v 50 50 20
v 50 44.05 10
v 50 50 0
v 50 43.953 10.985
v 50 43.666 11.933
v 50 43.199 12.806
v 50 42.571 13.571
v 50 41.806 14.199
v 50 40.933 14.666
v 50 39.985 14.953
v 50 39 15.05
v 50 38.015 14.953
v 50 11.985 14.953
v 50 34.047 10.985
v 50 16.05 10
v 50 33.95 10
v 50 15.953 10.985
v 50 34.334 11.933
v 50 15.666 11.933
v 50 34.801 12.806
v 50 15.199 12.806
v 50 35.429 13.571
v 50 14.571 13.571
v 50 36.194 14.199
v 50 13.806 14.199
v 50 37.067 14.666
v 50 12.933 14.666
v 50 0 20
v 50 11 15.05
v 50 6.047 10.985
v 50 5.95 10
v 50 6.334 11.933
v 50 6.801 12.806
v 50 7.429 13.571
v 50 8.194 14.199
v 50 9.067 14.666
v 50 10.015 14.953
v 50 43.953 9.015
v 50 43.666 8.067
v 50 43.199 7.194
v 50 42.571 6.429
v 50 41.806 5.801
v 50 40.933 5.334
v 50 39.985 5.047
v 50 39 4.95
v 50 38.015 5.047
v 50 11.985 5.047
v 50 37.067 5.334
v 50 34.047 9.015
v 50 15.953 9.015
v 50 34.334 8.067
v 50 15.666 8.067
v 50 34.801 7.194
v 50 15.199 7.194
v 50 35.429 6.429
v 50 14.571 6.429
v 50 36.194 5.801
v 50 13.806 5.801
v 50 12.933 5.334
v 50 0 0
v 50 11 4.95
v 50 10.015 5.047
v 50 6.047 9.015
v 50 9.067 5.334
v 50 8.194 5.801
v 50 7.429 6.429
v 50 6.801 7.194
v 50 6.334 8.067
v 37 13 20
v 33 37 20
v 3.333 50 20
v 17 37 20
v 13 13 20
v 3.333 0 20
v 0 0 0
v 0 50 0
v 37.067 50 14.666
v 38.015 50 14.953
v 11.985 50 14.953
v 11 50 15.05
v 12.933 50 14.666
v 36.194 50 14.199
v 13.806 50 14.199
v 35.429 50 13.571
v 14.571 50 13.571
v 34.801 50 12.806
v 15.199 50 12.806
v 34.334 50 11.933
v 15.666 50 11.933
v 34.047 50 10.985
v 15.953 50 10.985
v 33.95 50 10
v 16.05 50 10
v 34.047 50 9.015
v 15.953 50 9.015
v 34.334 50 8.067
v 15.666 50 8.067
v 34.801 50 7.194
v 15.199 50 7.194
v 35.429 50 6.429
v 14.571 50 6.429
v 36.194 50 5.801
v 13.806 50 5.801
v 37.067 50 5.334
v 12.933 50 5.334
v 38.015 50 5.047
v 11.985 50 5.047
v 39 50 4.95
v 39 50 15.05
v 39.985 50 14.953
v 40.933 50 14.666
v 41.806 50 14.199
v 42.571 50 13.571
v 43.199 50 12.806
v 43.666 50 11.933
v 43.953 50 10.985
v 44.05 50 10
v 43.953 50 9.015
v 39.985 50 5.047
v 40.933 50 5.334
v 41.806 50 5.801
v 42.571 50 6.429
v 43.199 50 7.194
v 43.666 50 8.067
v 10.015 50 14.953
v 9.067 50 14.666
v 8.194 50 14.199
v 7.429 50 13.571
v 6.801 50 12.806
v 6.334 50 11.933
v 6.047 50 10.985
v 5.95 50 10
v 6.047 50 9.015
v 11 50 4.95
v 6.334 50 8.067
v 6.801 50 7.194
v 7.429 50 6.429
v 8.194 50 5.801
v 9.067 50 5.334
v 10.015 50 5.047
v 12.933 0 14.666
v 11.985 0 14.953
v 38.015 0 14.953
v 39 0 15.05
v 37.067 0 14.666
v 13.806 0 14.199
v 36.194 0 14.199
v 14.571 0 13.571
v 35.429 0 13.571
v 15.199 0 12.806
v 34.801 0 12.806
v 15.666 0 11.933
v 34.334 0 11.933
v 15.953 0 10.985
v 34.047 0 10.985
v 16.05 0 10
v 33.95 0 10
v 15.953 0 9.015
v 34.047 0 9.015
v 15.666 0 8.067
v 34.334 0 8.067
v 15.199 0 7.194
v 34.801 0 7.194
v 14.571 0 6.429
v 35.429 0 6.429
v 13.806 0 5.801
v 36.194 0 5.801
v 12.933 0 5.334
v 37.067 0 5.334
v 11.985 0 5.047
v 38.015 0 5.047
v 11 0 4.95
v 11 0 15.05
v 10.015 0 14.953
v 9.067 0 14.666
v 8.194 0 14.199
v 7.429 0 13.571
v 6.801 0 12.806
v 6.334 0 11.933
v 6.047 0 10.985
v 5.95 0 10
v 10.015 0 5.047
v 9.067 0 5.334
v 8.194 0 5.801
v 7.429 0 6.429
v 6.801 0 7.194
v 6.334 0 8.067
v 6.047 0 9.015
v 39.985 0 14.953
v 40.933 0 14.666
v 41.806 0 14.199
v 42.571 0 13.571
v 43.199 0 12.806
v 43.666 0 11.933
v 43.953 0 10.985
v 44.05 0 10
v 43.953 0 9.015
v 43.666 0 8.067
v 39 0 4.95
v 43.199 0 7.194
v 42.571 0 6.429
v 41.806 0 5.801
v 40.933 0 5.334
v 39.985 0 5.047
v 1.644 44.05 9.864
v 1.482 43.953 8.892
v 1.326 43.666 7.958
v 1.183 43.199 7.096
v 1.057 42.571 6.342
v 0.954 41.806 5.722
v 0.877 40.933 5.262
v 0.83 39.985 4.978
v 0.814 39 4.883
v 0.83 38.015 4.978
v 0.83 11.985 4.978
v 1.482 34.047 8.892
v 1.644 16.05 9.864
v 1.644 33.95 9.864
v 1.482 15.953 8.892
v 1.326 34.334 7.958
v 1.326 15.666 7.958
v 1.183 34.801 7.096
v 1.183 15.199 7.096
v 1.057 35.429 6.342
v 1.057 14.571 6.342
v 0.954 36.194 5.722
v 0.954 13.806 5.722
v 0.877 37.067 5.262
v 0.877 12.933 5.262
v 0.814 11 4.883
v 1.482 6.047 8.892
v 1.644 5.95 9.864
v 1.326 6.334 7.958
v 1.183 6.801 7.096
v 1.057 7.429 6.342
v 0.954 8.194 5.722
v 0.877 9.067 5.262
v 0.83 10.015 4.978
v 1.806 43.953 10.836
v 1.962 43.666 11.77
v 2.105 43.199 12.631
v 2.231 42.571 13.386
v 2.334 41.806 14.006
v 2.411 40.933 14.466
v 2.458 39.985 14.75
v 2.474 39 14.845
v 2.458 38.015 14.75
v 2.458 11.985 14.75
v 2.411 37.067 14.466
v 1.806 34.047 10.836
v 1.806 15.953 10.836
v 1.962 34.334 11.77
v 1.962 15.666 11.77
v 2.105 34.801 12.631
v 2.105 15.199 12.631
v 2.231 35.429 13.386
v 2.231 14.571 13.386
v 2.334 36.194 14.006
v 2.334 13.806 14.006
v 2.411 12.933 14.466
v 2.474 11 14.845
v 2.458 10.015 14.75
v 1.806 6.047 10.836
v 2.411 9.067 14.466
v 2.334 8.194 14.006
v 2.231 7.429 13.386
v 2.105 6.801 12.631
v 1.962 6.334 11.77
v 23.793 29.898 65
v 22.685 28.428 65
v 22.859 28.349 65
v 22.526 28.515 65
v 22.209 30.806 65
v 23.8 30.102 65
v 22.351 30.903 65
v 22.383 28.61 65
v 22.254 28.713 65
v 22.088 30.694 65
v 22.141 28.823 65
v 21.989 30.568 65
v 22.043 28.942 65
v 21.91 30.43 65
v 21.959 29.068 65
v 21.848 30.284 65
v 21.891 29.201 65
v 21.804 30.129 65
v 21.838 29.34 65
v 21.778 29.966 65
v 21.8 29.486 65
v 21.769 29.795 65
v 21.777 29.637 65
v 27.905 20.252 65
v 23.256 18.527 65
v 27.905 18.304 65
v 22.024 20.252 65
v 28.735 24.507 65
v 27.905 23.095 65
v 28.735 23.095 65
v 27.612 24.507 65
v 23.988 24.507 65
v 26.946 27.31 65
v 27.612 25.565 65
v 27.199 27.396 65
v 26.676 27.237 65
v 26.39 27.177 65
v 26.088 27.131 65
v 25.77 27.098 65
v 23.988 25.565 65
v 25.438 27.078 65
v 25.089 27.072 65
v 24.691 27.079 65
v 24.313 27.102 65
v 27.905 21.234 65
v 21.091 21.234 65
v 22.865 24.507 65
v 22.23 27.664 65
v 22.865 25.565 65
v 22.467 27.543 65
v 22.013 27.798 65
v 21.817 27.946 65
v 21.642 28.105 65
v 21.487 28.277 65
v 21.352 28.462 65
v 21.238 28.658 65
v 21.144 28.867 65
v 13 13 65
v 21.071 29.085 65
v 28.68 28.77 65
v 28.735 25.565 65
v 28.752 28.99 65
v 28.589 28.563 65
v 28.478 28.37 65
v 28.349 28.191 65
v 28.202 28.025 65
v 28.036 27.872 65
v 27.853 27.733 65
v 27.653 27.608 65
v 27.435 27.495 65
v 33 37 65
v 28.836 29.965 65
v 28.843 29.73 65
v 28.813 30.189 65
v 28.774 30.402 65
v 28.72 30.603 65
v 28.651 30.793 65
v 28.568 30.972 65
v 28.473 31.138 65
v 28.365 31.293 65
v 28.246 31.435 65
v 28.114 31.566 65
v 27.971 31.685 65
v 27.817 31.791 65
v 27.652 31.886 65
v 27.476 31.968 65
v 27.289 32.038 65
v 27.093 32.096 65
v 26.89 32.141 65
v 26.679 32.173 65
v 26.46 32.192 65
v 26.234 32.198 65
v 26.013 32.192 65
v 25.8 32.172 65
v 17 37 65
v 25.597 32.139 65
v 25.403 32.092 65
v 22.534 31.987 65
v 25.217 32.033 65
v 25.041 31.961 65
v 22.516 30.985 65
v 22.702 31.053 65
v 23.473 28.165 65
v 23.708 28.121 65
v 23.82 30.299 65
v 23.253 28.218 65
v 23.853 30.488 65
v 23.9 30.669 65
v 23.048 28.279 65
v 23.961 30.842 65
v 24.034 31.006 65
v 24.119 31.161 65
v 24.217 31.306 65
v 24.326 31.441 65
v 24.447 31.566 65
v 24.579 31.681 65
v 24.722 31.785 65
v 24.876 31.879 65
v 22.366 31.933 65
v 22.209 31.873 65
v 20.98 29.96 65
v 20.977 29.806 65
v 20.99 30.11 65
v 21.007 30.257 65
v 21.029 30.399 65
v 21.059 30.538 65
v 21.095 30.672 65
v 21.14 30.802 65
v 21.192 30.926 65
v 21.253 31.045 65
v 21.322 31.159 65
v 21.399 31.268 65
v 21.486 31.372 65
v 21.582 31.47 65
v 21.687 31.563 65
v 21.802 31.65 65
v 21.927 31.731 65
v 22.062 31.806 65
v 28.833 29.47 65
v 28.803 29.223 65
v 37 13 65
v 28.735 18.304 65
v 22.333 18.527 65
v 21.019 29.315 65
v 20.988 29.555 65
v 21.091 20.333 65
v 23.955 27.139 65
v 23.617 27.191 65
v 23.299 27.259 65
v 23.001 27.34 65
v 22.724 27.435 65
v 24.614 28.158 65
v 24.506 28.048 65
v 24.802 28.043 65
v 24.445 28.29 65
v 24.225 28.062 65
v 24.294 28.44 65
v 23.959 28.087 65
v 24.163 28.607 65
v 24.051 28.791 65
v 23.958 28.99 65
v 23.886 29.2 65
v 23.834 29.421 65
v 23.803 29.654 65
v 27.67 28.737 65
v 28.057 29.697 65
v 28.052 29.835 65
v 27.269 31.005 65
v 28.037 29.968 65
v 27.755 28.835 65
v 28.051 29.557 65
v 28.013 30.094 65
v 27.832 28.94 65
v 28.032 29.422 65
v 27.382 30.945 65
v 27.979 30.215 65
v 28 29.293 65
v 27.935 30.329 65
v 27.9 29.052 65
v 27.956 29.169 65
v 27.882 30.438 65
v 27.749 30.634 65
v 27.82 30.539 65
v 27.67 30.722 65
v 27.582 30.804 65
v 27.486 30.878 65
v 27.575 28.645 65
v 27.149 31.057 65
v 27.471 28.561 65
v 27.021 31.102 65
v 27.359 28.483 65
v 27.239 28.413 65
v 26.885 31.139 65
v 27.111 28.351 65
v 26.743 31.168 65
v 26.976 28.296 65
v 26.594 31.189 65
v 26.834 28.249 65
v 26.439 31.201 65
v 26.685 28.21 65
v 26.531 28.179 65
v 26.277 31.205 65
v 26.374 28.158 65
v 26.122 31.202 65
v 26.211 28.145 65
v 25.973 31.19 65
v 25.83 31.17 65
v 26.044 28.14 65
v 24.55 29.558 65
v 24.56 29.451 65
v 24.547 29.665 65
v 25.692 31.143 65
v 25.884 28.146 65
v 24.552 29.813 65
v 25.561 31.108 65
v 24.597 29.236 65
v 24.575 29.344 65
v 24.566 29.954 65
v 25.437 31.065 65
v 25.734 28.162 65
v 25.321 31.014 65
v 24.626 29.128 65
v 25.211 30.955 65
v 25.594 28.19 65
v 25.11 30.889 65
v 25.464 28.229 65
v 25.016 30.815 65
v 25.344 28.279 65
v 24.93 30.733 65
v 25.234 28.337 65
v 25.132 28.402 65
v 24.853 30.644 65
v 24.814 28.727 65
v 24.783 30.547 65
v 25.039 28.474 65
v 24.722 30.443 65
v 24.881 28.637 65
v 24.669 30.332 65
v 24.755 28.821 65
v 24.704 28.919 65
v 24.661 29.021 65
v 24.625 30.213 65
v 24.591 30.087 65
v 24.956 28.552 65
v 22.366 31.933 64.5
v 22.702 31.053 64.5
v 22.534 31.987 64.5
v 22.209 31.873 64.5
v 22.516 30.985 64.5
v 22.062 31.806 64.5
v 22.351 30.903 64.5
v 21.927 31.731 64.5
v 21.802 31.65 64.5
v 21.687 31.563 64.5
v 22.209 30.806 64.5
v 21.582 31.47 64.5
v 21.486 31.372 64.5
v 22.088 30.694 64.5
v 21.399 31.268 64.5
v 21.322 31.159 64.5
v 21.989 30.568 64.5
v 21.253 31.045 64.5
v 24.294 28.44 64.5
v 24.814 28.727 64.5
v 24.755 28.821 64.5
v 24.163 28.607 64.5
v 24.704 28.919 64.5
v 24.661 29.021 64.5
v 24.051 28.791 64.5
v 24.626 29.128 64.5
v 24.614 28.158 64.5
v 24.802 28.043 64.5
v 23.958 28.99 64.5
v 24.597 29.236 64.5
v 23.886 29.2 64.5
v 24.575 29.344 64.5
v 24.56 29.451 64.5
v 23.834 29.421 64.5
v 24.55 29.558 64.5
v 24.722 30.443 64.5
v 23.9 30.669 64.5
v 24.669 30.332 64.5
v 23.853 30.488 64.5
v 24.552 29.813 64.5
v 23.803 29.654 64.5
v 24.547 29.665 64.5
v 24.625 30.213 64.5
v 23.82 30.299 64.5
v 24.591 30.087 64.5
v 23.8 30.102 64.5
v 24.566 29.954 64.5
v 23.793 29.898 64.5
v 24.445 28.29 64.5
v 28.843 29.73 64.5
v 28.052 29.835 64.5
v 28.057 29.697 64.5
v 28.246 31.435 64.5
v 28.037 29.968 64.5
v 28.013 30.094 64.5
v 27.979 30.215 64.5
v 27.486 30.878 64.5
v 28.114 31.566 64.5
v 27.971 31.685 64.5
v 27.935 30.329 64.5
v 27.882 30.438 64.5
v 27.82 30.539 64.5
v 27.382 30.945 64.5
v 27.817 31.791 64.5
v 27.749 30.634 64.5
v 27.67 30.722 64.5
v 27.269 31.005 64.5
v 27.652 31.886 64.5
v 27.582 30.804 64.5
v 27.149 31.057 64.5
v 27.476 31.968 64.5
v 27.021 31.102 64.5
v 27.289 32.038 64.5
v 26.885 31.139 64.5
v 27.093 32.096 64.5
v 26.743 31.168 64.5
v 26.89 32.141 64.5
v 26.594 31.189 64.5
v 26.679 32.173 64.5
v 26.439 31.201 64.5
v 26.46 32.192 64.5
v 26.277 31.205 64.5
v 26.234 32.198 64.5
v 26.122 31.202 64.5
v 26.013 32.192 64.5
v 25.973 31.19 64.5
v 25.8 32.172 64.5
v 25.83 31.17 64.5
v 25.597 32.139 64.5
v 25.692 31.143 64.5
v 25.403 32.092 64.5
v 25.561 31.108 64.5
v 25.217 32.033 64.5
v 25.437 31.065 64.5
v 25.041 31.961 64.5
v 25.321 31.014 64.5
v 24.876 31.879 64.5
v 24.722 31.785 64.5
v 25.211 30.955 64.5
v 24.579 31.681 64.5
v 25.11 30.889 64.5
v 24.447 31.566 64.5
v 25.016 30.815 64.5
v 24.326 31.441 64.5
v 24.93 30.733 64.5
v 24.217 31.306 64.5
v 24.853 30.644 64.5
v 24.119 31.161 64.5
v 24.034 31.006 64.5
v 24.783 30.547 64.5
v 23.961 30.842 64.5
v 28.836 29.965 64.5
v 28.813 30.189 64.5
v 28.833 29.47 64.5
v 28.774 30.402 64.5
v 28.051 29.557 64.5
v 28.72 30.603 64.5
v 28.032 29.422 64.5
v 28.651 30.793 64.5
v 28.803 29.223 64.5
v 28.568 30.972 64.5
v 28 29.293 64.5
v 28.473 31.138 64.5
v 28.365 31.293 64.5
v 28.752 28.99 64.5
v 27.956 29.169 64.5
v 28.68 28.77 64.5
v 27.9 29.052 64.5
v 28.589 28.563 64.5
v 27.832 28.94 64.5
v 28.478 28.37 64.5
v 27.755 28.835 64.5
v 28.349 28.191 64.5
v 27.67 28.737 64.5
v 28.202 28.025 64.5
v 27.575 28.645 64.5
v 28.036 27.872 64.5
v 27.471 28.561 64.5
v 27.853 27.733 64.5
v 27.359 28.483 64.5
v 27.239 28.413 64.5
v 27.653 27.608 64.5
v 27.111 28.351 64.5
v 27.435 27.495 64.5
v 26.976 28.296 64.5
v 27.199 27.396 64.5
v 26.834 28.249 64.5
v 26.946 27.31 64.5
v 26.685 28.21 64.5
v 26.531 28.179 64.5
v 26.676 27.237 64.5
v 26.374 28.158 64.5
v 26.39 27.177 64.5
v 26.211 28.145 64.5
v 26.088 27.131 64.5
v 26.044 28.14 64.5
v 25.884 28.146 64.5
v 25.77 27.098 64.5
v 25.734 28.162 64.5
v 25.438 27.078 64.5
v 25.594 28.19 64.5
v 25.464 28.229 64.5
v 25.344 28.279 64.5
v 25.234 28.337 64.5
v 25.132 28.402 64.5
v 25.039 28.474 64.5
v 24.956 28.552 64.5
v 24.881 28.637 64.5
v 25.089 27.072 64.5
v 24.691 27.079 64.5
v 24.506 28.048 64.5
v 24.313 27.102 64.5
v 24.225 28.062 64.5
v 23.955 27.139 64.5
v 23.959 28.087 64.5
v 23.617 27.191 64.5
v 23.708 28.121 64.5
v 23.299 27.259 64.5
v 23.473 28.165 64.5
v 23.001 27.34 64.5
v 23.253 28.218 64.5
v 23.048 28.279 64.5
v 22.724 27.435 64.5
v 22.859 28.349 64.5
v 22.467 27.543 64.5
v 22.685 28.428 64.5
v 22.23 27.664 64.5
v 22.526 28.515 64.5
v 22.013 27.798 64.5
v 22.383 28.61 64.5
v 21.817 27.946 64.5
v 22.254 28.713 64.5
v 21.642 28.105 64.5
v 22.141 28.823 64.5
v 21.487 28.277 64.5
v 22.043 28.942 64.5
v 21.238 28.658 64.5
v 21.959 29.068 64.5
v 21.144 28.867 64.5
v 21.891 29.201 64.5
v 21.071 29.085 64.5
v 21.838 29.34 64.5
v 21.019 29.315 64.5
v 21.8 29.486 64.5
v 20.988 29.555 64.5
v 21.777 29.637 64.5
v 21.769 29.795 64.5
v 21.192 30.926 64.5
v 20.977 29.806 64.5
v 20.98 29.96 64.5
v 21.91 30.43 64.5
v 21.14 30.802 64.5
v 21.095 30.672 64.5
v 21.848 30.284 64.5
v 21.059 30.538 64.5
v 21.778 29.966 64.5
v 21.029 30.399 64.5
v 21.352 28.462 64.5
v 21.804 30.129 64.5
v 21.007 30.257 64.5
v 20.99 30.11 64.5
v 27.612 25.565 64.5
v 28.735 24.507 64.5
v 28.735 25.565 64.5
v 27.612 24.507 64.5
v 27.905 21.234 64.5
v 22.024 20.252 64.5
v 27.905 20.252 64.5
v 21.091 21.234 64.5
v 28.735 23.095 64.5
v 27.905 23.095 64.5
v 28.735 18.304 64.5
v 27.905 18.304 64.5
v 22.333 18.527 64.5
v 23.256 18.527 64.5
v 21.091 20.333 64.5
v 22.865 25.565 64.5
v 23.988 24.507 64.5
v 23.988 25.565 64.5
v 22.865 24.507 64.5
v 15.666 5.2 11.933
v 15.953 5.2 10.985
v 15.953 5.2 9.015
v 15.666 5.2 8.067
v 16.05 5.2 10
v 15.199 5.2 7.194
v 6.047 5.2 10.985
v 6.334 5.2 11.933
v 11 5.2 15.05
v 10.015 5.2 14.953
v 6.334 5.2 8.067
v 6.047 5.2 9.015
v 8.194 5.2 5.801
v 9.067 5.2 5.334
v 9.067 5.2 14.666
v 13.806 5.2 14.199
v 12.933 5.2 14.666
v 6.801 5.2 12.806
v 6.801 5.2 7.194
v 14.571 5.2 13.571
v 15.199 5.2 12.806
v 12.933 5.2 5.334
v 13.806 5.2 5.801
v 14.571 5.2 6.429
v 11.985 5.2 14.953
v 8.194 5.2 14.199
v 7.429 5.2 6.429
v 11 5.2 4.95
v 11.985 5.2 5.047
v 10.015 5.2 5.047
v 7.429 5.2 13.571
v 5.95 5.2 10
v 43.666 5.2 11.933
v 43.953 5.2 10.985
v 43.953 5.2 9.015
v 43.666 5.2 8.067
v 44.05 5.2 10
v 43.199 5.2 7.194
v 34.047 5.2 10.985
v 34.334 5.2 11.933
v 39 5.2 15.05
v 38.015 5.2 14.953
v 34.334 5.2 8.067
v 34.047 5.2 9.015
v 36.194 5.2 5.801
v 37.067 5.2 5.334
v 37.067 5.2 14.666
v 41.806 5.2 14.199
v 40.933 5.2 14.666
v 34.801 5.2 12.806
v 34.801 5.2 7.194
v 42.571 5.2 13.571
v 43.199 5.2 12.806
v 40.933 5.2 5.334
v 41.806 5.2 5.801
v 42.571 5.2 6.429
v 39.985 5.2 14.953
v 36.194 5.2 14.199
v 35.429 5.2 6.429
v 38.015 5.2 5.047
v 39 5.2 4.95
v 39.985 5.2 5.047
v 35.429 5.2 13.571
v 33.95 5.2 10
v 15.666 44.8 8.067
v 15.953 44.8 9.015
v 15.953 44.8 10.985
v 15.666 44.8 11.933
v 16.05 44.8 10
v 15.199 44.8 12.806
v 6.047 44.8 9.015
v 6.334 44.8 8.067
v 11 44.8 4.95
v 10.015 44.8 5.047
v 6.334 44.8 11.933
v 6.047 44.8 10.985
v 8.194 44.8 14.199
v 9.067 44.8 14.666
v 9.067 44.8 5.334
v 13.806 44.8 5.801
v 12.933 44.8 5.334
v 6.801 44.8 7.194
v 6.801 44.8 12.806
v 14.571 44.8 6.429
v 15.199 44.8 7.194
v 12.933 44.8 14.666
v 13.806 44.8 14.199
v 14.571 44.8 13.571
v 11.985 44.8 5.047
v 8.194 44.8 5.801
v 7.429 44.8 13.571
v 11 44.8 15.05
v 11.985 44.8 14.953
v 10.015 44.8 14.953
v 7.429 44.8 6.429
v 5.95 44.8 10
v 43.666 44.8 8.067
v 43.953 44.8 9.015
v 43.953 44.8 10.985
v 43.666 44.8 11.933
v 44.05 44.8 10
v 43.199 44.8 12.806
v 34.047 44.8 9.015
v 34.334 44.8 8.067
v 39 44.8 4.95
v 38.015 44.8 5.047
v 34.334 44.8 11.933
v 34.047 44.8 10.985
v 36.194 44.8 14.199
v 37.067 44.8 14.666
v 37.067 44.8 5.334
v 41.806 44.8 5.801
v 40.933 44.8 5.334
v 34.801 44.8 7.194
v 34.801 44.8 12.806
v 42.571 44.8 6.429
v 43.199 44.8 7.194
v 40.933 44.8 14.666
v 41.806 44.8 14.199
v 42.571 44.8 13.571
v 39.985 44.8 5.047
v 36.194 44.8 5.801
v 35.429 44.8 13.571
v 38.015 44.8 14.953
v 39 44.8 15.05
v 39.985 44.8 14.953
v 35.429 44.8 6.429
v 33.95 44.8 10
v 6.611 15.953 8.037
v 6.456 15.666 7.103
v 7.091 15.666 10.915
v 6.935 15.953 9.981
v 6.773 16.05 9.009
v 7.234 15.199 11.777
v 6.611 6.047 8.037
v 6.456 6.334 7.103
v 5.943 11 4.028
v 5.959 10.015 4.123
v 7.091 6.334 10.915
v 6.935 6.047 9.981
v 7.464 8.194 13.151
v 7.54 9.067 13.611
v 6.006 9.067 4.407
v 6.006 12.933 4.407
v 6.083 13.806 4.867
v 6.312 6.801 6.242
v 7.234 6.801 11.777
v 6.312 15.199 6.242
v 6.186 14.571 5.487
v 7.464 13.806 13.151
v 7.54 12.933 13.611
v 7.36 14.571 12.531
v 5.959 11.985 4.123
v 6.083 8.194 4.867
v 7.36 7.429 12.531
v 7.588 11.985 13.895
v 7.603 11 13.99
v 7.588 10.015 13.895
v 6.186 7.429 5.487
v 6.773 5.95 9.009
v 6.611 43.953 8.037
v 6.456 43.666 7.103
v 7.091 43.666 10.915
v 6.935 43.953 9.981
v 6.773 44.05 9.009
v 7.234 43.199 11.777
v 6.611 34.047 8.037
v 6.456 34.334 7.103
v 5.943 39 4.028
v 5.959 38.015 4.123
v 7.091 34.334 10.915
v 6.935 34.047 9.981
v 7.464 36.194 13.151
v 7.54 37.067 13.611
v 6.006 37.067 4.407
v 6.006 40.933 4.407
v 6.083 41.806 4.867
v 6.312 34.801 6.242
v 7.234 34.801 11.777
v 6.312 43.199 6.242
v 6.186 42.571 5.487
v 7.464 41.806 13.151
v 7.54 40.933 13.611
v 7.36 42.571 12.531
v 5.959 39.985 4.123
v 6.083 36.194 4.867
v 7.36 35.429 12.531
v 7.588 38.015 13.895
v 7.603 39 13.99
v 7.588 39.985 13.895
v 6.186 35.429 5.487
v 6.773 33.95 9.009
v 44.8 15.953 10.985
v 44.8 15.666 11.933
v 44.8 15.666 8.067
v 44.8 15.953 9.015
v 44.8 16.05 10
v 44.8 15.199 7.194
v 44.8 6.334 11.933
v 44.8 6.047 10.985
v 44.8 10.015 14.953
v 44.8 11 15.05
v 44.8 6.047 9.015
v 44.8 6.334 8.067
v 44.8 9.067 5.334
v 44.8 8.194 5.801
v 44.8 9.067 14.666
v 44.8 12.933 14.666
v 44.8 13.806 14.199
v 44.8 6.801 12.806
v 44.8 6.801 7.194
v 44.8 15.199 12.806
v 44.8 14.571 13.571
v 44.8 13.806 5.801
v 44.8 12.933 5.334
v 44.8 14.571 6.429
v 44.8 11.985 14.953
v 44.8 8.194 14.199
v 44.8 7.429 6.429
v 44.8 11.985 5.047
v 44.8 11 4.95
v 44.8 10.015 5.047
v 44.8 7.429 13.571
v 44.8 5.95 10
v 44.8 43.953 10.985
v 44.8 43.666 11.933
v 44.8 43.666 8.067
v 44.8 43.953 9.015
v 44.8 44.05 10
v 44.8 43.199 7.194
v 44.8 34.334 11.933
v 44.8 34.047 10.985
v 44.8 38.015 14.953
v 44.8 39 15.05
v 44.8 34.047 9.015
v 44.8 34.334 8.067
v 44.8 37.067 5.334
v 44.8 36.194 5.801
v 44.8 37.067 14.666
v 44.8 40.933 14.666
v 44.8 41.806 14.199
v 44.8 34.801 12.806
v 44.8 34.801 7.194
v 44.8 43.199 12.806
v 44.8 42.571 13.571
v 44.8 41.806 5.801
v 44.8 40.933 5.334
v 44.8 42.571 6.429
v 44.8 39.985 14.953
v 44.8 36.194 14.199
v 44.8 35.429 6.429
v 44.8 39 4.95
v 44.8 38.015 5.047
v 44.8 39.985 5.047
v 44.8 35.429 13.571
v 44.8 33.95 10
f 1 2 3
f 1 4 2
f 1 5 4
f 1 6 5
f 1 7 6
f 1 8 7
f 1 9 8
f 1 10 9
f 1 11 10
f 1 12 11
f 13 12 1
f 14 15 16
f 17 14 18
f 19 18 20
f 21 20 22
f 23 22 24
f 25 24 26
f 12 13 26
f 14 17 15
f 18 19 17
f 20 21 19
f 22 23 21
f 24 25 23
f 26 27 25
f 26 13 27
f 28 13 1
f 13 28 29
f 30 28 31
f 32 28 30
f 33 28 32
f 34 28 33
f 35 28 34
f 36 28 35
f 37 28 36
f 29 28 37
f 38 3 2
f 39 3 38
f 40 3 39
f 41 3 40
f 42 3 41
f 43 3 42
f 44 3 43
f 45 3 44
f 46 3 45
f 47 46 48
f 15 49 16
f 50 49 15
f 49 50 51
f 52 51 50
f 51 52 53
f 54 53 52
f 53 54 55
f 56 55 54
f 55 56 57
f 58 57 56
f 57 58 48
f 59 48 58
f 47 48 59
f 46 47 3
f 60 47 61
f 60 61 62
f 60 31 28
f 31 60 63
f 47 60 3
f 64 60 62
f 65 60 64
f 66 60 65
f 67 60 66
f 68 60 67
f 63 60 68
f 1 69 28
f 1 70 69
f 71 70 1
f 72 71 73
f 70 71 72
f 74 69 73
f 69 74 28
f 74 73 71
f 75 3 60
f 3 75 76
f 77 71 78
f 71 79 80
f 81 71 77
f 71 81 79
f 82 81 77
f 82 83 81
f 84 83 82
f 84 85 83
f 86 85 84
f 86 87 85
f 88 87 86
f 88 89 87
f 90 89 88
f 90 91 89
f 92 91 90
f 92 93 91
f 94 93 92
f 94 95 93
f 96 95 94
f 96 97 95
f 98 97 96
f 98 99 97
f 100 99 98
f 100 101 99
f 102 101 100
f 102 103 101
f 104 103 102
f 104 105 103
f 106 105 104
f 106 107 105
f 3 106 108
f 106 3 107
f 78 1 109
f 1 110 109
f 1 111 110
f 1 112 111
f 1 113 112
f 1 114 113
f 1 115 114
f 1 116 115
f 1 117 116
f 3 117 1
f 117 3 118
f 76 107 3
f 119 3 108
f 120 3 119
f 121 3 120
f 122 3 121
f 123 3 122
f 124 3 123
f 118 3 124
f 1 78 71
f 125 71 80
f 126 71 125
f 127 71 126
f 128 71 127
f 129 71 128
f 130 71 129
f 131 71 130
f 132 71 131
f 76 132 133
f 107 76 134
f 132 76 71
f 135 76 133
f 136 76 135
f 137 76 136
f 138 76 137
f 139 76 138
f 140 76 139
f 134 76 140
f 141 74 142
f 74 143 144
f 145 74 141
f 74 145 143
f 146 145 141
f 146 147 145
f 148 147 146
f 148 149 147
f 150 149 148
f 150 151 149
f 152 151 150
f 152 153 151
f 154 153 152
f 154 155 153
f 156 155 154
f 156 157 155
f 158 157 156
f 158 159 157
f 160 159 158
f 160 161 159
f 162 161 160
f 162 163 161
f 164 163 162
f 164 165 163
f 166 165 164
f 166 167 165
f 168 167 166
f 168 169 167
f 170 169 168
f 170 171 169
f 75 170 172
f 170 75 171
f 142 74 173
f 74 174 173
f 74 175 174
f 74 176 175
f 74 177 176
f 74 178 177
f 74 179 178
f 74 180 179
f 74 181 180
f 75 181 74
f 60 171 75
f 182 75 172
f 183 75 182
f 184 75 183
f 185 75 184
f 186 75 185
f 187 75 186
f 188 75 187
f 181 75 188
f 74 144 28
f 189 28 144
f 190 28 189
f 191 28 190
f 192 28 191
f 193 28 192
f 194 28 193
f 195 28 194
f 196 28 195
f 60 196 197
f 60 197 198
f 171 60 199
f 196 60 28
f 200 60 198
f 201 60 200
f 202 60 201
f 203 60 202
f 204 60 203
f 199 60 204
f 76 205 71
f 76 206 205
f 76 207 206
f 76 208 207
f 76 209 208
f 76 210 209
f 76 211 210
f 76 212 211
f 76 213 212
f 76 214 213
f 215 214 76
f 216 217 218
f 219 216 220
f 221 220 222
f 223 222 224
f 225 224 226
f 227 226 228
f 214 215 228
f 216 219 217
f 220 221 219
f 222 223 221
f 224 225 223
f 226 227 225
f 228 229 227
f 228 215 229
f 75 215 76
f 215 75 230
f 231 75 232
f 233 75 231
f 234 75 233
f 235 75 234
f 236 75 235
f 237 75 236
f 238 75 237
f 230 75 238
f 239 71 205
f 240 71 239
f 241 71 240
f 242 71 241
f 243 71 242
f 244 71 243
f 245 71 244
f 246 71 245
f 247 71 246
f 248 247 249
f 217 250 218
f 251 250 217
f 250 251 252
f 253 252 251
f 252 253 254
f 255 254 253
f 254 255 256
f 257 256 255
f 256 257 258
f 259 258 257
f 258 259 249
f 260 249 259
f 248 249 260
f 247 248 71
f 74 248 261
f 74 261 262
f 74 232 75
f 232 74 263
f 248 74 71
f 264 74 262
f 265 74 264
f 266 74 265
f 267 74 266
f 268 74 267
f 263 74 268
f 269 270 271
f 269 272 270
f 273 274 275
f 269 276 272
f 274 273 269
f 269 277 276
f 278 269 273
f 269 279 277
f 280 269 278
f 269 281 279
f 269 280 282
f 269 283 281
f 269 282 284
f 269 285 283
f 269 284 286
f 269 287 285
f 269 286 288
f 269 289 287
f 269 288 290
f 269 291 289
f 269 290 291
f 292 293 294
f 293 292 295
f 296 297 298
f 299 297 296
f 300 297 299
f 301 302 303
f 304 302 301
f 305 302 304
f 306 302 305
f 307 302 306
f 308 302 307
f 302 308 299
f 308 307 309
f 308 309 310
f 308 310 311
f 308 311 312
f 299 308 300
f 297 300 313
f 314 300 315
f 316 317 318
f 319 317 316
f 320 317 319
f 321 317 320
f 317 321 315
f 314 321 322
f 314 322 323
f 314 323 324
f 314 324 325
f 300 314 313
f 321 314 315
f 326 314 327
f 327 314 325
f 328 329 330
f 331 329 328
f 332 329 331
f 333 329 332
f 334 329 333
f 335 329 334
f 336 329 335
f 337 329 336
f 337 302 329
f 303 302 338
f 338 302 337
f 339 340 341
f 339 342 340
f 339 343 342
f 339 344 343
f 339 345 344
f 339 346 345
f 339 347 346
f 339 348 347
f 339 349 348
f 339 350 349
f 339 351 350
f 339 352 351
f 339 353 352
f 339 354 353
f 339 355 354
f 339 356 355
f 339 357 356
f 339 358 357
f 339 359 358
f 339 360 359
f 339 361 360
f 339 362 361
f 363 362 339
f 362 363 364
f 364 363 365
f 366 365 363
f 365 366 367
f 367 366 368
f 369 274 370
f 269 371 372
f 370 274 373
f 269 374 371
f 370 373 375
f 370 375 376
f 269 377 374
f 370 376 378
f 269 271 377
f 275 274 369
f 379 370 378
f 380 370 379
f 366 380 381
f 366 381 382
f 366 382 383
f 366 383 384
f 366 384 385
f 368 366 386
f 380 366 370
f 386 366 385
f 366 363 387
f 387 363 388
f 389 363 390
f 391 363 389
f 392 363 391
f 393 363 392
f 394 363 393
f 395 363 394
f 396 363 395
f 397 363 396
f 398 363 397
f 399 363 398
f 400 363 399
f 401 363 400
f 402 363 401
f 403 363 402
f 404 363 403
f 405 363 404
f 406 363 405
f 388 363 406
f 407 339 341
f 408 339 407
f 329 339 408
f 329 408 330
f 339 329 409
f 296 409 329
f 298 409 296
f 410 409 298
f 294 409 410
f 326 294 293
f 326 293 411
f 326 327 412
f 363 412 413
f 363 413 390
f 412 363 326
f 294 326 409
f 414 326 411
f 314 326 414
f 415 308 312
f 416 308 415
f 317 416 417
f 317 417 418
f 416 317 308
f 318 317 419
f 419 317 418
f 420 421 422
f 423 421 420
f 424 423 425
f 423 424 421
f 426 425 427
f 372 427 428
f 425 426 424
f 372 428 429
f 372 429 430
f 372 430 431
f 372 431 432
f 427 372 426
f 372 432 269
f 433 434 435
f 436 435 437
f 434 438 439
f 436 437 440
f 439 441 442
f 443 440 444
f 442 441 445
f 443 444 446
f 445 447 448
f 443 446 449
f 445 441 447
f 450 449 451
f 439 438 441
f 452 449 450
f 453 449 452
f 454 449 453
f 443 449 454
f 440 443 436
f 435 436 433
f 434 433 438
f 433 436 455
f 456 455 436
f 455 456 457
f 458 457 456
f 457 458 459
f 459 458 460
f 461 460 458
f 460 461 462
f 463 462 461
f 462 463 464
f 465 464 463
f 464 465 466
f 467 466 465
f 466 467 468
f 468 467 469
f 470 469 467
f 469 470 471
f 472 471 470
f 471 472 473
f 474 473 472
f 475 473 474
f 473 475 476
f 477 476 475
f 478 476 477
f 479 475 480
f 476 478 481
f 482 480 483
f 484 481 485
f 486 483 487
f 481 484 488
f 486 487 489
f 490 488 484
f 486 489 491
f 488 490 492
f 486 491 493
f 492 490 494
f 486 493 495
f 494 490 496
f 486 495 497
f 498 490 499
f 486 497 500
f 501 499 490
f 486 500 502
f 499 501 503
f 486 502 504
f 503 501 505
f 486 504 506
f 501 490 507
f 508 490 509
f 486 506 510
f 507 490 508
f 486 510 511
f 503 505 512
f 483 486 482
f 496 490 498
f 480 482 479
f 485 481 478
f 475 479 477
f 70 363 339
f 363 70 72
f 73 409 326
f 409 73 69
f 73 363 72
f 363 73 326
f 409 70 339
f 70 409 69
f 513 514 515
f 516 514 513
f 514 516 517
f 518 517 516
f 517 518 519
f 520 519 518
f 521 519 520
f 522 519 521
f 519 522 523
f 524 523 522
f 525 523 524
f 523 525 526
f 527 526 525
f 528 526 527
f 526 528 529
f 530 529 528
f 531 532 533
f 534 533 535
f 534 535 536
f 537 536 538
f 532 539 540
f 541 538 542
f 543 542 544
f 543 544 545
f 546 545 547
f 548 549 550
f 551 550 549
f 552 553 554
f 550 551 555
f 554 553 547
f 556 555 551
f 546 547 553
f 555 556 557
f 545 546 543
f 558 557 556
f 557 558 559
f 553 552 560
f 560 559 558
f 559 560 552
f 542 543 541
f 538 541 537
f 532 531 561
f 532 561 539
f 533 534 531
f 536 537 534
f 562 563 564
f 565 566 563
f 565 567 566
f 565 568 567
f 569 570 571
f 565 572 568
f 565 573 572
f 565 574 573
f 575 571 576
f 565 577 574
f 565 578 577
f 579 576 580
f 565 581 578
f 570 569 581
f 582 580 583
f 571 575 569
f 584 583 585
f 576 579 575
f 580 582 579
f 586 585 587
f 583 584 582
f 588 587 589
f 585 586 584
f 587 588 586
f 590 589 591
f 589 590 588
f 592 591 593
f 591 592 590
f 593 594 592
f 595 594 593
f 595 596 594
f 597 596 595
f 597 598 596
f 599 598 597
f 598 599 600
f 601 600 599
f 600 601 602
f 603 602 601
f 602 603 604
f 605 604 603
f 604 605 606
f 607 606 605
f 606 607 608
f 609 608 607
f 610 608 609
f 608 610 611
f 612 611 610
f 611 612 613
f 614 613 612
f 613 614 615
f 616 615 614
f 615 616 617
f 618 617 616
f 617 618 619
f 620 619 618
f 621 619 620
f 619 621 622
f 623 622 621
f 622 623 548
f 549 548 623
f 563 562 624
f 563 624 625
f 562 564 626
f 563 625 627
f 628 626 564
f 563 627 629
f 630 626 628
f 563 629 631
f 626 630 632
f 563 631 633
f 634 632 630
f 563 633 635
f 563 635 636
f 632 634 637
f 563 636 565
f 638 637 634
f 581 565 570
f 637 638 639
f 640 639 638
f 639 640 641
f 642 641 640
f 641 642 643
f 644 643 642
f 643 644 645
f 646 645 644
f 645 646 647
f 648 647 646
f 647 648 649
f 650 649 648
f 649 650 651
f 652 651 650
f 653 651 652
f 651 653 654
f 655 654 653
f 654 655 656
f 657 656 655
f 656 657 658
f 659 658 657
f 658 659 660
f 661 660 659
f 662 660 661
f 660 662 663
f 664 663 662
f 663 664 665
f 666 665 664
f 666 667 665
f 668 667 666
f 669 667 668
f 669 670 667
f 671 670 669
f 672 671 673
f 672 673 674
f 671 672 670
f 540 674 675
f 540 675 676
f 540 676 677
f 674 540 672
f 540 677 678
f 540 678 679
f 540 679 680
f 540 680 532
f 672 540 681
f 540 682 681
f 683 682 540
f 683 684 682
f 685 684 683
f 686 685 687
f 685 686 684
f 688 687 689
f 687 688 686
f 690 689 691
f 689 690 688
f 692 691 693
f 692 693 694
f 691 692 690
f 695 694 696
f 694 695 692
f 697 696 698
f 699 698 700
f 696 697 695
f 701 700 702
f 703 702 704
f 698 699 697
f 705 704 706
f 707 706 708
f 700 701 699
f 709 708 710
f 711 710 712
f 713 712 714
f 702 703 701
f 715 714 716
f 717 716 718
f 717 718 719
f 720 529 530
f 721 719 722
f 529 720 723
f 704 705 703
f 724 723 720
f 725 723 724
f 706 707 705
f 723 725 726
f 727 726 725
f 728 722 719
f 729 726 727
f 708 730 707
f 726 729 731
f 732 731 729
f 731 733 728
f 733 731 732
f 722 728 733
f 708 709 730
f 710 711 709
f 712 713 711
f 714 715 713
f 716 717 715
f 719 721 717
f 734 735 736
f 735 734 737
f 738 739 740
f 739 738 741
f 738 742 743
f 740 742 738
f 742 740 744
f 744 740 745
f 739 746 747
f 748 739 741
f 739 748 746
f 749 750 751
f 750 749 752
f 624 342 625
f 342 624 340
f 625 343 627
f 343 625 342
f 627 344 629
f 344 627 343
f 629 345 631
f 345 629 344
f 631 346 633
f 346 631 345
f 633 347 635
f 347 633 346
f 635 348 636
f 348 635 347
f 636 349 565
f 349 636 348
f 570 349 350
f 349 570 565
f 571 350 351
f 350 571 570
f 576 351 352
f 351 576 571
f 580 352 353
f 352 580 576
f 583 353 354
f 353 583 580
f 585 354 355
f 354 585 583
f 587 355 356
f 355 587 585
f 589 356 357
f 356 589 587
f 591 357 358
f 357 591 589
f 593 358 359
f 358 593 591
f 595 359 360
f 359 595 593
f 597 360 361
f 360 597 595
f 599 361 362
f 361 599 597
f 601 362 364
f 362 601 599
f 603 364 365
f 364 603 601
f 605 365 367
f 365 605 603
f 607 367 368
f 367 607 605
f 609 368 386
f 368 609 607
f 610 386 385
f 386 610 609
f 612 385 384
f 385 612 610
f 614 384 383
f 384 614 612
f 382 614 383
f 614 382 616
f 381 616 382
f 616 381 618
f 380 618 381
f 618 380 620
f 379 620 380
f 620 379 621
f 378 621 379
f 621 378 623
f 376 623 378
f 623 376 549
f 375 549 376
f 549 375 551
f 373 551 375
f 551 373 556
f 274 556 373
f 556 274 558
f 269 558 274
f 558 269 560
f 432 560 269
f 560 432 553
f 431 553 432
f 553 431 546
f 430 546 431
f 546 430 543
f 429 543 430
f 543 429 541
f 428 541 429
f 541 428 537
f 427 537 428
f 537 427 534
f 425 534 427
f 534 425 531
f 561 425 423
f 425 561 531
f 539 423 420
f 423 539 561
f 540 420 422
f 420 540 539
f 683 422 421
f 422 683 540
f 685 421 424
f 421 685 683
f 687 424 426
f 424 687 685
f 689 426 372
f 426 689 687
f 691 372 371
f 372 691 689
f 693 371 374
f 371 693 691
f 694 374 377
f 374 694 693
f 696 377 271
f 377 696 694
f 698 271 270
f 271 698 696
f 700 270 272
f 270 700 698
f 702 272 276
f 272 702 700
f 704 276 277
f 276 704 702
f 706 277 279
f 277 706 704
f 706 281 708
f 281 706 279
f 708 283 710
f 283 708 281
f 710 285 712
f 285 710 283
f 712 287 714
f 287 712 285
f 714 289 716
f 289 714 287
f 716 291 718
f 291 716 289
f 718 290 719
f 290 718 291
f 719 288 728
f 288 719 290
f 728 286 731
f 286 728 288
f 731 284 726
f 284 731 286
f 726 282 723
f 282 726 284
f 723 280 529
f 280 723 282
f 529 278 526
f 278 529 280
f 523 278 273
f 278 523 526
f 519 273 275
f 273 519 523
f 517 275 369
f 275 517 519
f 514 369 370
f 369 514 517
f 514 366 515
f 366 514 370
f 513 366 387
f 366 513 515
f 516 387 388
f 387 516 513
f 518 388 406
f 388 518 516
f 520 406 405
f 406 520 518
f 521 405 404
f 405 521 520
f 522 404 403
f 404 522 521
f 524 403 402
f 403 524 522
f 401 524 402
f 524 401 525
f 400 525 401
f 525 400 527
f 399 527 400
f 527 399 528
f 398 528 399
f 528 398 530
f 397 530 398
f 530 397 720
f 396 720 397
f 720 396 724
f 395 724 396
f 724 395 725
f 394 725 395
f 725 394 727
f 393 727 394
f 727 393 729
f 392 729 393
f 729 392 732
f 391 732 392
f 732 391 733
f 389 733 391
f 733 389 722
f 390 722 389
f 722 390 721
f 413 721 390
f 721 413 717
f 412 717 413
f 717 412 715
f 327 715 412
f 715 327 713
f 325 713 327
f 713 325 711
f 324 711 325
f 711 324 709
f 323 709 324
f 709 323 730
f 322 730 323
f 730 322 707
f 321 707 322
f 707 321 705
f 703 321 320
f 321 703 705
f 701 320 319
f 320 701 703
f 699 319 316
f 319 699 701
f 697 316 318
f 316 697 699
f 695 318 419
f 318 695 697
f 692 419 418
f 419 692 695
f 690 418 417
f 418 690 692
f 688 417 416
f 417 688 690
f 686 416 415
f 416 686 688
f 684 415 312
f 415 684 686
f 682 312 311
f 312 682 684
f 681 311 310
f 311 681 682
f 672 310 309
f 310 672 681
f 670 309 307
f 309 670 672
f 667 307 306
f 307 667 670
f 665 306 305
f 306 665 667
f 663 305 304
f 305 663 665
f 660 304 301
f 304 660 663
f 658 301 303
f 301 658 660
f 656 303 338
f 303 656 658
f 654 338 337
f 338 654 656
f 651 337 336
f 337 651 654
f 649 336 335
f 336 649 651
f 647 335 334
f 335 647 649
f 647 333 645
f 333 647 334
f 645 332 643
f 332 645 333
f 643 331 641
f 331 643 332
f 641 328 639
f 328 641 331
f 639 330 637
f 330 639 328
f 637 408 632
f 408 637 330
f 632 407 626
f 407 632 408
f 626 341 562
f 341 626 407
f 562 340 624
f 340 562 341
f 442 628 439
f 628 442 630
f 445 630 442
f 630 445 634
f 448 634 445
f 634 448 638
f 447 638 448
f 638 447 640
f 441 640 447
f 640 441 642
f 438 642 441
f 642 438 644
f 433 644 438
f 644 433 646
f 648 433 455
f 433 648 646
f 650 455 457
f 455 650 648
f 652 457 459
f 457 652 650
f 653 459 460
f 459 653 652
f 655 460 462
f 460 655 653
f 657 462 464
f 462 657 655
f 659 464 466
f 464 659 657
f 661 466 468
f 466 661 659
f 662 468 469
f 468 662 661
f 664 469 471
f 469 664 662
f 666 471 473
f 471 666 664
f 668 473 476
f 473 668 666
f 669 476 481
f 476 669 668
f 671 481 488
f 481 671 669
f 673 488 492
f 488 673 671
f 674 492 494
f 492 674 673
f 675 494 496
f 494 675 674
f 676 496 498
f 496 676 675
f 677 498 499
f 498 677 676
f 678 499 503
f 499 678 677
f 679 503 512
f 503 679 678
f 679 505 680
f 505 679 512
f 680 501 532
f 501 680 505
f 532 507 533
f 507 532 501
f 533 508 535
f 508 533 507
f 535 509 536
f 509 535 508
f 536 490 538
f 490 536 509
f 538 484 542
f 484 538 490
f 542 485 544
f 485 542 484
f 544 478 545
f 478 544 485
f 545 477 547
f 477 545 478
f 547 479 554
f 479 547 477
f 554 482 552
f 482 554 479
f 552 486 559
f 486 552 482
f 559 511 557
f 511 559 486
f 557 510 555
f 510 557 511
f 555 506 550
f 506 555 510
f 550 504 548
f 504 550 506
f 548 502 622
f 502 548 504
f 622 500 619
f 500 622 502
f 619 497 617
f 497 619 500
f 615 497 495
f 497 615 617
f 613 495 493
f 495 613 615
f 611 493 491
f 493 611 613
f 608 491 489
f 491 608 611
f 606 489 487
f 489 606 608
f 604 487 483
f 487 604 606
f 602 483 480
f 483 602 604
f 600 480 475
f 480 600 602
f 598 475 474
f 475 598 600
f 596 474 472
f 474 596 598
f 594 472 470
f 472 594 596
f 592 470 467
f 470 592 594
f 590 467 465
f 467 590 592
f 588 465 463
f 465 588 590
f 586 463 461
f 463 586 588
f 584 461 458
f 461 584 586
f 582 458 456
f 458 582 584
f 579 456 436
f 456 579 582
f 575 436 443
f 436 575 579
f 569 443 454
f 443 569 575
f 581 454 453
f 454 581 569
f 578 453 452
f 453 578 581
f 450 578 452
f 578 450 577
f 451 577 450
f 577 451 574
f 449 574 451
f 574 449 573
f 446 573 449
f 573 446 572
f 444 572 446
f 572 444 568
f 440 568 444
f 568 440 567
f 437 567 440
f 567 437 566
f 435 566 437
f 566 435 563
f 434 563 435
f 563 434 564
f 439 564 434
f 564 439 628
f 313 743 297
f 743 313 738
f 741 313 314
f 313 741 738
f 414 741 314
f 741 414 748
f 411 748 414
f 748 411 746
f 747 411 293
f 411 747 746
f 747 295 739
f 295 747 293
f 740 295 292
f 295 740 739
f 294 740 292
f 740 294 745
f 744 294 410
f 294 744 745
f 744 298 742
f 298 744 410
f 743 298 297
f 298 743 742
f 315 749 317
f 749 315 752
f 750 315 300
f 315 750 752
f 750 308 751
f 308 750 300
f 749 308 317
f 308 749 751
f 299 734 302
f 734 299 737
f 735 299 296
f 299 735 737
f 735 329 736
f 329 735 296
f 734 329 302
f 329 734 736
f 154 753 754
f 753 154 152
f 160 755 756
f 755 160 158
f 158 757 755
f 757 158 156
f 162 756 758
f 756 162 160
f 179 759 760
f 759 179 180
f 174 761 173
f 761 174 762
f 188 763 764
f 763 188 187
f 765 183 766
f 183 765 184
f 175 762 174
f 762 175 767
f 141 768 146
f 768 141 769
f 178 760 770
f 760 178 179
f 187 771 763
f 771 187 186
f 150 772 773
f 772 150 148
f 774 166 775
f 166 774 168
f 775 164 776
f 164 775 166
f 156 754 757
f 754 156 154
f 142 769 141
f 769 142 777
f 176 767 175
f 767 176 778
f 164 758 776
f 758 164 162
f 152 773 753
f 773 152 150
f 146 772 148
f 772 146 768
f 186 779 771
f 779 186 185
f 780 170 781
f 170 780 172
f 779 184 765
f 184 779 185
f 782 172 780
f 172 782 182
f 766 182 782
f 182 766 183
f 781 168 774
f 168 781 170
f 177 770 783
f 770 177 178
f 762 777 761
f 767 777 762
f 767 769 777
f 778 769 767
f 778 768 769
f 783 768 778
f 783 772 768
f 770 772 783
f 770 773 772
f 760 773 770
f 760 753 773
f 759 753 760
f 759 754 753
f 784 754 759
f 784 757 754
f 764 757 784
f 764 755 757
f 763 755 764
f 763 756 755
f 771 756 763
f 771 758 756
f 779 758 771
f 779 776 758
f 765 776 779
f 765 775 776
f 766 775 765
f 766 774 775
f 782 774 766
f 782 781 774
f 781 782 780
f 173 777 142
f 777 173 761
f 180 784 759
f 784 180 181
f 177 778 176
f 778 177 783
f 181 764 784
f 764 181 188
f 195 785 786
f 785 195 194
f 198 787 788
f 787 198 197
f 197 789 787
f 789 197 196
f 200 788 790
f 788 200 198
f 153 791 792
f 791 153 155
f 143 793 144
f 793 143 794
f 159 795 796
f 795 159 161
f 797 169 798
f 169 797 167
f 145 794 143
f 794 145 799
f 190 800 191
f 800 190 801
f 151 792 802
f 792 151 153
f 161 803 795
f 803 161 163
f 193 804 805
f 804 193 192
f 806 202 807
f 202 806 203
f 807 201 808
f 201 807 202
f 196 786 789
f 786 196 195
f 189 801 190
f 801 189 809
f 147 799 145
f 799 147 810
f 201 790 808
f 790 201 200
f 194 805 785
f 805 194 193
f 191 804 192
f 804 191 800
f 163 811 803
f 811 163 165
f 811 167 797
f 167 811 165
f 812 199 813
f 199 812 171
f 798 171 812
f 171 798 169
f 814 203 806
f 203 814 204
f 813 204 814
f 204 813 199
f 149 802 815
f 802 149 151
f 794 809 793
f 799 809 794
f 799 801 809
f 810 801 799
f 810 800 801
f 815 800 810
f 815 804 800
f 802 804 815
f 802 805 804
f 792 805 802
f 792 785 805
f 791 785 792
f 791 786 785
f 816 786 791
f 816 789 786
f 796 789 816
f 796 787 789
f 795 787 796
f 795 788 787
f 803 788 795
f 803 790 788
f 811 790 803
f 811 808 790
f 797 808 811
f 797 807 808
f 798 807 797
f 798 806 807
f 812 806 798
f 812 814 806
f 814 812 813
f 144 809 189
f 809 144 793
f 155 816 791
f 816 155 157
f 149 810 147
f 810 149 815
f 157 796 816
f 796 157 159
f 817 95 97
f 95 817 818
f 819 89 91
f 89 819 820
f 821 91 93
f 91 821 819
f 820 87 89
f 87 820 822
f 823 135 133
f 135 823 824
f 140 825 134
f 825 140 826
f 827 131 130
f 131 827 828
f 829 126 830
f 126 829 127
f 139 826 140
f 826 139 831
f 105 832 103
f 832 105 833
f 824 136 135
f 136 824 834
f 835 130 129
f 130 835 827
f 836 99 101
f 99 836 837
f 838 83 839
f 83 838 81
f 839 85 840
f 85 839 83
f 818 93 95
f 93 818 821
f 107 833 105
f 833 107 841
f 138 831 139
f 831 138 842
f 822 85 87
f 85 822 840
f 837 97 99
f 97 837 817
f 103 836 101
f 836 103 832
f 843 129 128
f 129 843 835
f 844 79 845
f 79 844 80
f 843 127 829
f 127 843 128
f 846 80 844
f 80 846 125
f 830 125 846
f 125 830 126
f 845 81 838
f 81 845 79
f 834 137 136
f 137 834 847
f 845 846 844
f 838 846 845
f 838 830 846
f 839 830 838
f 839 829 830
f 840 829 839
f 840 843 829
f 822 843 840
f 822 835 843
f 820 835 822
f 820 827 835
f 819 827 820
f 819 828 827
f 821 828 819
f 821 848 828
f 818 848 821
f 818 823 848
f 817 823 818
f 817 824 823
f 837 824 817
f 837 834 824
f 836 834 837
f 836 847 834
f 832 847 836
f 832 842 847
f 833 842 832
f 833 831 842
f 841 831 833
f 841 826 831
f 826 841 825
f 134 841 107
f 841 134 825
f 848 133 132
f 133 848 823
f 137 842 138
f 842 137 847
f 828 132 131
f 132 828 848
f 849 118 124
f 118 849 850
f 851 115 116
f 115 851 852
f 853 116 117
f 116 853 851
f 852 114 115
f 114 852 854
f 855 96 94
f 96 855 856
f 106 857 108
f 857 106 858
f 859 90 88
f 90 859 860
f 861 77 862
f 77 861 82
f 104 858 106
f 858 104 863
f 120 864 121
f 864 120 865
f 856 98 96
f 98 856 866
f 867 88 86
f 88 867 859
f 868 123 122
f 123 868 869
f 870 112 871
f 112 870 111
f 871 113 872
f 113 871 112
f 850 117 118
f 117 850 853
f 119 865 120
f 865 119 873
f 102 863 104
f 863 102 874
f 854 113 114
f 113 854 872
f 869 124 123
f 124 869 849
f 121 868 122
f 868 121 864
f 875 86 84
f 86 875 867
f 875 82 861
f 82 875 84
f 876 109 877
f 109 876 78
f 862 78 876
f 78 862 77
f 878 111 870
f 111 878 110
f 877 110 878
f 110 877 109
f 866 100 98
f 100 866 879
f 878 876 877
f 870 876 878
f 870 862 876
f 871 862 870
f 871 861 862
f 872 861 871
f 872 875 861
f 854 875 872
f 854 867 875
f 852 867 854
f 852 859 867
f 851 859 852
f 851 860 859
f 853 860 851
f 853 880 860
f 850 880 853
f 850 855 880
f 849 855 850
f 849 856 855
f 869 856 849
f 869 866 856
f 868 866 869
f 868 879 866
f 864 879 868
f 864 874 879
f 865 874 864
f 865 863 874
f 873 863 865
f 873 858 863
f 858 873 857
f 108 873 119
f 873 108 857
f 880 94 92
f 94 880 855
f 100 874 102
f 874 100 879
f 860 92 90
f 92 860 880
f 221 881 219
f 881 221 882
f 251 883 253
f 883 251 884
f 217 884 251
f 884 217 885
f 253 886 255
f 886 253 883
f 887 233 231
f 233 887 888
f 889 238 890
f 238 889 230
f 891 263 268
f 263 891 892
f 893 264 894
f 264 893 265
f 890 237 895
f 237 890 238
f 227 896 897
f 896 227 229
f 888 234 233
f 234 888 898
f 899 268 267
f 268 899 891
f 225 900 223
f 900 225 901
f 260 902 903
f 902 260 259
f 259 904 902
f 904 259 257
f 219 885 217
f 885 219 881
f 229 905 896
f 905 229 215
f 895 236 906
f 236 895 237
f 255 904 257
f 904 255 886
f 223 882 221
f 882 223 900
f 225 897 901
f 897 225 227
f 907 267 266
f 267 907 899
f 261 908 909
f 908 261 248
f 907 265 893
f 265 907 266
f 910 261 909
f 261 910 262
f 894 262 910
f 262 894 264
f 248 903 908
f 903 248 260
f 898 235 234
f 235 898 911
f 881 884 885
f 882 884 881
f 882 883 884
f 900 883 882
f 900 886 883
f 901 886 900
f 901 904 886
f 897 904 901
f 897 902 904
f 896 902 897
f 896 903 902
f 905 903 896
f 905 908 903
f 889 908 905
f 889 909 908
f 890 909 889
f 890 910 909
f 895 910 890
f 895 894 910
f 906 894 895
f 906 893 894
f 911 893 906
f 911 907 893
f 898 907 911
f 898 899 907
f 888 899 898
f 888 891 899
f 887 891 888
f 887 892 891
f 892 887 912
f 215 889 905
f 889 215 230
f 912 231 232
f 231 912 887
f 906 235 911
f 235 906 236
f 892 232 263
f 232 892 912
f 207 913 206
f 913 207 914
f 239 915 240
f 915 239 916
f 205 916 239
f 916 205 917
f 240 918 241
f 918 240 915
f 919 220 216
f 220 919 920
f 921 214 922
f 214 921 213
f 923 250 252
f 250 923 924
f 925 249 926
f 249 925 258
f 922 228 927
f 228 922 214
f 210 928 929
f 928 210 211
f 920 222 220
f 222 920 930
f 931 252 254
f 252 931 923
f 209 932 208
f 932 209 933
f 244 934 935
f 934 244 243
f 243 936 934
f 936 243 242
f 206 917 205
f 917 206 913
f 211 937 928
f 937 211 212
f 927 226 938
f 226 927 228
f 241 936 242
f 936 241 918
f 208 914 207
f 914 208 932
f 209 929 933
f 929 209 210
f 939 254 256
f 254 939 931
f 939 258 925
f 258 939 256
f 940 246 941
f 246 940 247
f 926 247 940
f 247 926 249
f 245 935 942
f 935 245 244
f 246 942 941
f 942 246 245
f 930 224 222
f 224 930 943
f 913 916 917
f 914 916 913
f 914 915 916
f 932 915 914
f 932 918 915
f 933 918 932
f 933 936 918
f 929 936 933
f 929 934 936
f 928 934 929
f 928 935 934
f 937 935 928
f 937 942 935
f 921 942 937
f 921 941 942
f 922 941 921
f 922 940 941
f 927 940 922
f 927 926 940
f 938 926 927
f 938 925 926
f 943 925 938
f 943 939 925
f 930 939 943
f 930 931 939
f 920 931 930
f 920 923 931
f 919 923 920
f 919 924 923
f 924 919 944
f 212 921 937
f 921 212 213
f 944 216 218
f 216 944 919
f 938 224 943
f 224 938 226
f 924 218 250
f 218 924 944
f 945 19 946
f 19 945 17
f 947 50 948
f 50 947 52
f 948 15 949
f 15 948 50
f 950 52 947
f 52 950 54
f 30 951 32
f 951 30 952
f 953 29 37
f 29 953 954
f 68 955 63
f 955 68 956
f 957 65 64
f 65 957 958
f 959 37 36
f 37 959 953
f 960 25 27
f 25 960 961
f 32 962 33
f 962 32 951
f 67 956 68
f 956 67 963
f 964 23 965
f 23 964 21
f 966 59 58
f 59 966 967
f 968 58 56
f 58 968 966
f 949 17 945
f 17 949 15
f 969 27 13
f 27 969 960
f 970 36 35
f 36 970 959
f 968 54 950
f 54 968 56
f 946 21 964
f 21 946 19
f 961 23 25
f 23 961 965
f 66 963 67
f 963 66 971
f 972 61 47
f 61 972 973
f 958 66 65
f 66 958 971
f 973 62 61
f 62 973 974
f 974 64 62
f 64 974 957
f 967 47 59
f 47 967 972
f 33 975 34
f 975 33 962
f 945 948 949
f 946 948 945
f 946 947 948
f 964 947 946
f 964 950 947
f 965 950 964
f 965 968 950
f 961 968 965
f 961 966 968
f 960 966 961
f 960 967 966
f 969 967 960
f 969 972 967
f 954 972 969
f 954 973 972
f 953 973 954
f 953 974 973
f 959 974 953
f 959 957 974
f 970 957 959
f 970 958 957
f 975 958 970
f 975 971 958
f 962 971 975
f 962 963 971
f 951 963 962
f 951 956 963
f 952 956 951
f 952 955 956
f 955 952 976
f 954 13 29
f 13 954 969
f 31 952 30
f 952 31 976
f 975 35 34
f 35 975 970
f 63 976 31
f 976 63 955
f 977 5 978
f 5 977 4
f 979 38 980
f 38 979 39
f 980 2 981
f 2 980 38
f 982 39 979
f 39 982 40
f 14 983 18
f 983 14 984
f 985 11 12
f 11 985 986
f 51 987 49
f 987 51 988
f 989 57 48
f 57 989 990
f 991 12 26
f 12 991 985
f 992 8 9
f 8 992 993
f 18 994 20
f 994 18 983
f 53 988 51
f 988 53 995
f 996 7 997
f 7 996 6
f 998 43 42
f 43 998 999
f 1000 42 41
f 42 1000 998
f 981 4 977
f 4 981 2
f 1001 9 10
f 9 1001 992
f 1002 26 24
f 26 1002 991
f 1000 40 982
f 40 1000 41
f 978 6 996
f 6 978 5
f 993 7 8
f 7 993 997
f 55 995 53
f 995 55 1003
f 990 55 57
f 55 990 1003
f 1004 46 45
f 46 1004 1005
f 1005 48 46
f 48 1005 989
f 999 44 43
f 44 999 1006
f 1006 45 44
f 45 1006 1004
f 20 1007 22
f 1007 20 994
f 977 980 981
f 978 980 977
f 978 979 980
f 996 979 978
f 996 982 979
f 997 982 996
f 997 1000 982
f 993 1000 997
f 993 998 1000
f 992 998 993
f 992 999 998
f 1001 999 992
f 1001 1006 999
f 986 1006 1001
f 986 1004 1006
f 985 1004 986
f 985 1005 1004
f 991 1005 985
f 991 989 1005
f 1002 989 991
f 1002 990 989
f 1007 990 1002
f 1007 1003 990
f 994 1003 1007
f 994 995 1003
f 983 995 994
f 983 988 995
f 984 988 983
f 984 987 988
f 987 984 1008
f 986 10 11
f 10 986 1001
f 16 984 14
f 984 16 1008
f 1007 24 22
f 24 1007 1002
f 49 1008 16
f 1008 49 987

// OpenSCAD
/*[Parameters]*/
//Type of dovetail
type = 6;//[4:1/4,5:1/5,6:1/6,7:1/7,8:1/8]
//Diam of magnet
magnet_d = 10;
//Height of magnet
magnet_h = 5;
icons = 0; //[0:no, 1:yes]
/*[Advanced]*/
//Magnet diam gap
gap_d = 0.1;
//Magnet diam height
gap_h = 0.2;
//Width of base
w = 50;
//Width of tower
w1 = 24;
//Height of base
h = 65;
//Height of tower
h1 = 20;
/*[Hidden]*/
$fn=32;
//icon size
i_h = w/5;
//text size
t_h = w1/3;
//text depth
t_d = 0.5;
a = atan2(1,type);
module pin(){
	translate([(w-w1)/2,(w-w1)/2,0])difference(){
		cube([w1,w1,h]);
		rotate([0,0,90-a])cube([w1*2,w1,h+1]);
		translate([w1,0,0]) rotate([0,0,a])cube([w1,w1*2,h+1]);
		translate([w1/2, w1/2, h-t_d]) rotate([0, 0, 90]) linear_extrude(1) text(str("1:",type), size = t_h, halign = "center", valign = "center");
	}
}
module base(){
	difference(){
	difference(){
		cube([w,w,h1]);
		rotate([0,a-90,0])cube([w,w,2*h1]);
	}
}
}
difference(){
	union(){
		base();
		pin();
	}
	translate([0,0,h1/2])holes();
	translate([0,w,h1/2])rotate([180,0,0])holes();
	rotate([0,a,0])translate([0,0,h1/2])rotate([0,0,90])rotate([180,0,0])holes();
	translate([w,0,h1/2])rotate([0,0,90])holes();
	if(icons){
		translate([w/2-i_h/2,w/10,0]) pins();
		translate([w/2+i_h/2,w*9/10,0]) rotate([0,0,180]) pins();
		translate([i_h+w/10,w/2-i_h/2,0]) rotate([0,0,90]) tails();
		translate([w*9/10,w/2-i_h/2,0]) rotate([0,0,90]) angle90();
	}
}
module holes(){
	delta = magnet_h+magnet_d/2+1;
	for(i = [delta,w-delta]){
		translate([i,-1,0])rotate([-90,0,0])cylinder(d = magnet_d+gap_d, h = magnet_h+gap_h+1);
	}
}
module pins(){
	ang = atan2(1,4);
	cube([i_h,1,1]);
	translate([0,i_h*.6,0])cube([i_h,1,1]);
	translate([i_h/8,1,0])rotate([0,0,90-ang])translate([0,-1,0])cube([i_h*.6,1,1]);
	translate([i_h*7/8,1,0])rotate([0,0,90+ang])cube([i_h*.6,1,1]);
}
module tails(){
	ang = atan2(1,4);
	cube([i_h,1,1]);
	translate([0,i_h,0])cube([i_h,1,1]);
	translate([0,1,0])rotate([0,0,90-ang])translate([0,-1,0])cube([i_h,1,1]);
	translate([i_h,1,0])rotate([0,0,90+ang])cube([i_h,1,1]);
}
module angle90(){
	cube([i_h,1,1]);
	cube([1,i_h,1]);
	translate([i_h/2+1,i_h/2+1,0])rotate([0,0,180])union(){
		cube([i_h/2+0.5,1,1]);
		cube([1,i_h/2+0.5,1]);
	}
}
